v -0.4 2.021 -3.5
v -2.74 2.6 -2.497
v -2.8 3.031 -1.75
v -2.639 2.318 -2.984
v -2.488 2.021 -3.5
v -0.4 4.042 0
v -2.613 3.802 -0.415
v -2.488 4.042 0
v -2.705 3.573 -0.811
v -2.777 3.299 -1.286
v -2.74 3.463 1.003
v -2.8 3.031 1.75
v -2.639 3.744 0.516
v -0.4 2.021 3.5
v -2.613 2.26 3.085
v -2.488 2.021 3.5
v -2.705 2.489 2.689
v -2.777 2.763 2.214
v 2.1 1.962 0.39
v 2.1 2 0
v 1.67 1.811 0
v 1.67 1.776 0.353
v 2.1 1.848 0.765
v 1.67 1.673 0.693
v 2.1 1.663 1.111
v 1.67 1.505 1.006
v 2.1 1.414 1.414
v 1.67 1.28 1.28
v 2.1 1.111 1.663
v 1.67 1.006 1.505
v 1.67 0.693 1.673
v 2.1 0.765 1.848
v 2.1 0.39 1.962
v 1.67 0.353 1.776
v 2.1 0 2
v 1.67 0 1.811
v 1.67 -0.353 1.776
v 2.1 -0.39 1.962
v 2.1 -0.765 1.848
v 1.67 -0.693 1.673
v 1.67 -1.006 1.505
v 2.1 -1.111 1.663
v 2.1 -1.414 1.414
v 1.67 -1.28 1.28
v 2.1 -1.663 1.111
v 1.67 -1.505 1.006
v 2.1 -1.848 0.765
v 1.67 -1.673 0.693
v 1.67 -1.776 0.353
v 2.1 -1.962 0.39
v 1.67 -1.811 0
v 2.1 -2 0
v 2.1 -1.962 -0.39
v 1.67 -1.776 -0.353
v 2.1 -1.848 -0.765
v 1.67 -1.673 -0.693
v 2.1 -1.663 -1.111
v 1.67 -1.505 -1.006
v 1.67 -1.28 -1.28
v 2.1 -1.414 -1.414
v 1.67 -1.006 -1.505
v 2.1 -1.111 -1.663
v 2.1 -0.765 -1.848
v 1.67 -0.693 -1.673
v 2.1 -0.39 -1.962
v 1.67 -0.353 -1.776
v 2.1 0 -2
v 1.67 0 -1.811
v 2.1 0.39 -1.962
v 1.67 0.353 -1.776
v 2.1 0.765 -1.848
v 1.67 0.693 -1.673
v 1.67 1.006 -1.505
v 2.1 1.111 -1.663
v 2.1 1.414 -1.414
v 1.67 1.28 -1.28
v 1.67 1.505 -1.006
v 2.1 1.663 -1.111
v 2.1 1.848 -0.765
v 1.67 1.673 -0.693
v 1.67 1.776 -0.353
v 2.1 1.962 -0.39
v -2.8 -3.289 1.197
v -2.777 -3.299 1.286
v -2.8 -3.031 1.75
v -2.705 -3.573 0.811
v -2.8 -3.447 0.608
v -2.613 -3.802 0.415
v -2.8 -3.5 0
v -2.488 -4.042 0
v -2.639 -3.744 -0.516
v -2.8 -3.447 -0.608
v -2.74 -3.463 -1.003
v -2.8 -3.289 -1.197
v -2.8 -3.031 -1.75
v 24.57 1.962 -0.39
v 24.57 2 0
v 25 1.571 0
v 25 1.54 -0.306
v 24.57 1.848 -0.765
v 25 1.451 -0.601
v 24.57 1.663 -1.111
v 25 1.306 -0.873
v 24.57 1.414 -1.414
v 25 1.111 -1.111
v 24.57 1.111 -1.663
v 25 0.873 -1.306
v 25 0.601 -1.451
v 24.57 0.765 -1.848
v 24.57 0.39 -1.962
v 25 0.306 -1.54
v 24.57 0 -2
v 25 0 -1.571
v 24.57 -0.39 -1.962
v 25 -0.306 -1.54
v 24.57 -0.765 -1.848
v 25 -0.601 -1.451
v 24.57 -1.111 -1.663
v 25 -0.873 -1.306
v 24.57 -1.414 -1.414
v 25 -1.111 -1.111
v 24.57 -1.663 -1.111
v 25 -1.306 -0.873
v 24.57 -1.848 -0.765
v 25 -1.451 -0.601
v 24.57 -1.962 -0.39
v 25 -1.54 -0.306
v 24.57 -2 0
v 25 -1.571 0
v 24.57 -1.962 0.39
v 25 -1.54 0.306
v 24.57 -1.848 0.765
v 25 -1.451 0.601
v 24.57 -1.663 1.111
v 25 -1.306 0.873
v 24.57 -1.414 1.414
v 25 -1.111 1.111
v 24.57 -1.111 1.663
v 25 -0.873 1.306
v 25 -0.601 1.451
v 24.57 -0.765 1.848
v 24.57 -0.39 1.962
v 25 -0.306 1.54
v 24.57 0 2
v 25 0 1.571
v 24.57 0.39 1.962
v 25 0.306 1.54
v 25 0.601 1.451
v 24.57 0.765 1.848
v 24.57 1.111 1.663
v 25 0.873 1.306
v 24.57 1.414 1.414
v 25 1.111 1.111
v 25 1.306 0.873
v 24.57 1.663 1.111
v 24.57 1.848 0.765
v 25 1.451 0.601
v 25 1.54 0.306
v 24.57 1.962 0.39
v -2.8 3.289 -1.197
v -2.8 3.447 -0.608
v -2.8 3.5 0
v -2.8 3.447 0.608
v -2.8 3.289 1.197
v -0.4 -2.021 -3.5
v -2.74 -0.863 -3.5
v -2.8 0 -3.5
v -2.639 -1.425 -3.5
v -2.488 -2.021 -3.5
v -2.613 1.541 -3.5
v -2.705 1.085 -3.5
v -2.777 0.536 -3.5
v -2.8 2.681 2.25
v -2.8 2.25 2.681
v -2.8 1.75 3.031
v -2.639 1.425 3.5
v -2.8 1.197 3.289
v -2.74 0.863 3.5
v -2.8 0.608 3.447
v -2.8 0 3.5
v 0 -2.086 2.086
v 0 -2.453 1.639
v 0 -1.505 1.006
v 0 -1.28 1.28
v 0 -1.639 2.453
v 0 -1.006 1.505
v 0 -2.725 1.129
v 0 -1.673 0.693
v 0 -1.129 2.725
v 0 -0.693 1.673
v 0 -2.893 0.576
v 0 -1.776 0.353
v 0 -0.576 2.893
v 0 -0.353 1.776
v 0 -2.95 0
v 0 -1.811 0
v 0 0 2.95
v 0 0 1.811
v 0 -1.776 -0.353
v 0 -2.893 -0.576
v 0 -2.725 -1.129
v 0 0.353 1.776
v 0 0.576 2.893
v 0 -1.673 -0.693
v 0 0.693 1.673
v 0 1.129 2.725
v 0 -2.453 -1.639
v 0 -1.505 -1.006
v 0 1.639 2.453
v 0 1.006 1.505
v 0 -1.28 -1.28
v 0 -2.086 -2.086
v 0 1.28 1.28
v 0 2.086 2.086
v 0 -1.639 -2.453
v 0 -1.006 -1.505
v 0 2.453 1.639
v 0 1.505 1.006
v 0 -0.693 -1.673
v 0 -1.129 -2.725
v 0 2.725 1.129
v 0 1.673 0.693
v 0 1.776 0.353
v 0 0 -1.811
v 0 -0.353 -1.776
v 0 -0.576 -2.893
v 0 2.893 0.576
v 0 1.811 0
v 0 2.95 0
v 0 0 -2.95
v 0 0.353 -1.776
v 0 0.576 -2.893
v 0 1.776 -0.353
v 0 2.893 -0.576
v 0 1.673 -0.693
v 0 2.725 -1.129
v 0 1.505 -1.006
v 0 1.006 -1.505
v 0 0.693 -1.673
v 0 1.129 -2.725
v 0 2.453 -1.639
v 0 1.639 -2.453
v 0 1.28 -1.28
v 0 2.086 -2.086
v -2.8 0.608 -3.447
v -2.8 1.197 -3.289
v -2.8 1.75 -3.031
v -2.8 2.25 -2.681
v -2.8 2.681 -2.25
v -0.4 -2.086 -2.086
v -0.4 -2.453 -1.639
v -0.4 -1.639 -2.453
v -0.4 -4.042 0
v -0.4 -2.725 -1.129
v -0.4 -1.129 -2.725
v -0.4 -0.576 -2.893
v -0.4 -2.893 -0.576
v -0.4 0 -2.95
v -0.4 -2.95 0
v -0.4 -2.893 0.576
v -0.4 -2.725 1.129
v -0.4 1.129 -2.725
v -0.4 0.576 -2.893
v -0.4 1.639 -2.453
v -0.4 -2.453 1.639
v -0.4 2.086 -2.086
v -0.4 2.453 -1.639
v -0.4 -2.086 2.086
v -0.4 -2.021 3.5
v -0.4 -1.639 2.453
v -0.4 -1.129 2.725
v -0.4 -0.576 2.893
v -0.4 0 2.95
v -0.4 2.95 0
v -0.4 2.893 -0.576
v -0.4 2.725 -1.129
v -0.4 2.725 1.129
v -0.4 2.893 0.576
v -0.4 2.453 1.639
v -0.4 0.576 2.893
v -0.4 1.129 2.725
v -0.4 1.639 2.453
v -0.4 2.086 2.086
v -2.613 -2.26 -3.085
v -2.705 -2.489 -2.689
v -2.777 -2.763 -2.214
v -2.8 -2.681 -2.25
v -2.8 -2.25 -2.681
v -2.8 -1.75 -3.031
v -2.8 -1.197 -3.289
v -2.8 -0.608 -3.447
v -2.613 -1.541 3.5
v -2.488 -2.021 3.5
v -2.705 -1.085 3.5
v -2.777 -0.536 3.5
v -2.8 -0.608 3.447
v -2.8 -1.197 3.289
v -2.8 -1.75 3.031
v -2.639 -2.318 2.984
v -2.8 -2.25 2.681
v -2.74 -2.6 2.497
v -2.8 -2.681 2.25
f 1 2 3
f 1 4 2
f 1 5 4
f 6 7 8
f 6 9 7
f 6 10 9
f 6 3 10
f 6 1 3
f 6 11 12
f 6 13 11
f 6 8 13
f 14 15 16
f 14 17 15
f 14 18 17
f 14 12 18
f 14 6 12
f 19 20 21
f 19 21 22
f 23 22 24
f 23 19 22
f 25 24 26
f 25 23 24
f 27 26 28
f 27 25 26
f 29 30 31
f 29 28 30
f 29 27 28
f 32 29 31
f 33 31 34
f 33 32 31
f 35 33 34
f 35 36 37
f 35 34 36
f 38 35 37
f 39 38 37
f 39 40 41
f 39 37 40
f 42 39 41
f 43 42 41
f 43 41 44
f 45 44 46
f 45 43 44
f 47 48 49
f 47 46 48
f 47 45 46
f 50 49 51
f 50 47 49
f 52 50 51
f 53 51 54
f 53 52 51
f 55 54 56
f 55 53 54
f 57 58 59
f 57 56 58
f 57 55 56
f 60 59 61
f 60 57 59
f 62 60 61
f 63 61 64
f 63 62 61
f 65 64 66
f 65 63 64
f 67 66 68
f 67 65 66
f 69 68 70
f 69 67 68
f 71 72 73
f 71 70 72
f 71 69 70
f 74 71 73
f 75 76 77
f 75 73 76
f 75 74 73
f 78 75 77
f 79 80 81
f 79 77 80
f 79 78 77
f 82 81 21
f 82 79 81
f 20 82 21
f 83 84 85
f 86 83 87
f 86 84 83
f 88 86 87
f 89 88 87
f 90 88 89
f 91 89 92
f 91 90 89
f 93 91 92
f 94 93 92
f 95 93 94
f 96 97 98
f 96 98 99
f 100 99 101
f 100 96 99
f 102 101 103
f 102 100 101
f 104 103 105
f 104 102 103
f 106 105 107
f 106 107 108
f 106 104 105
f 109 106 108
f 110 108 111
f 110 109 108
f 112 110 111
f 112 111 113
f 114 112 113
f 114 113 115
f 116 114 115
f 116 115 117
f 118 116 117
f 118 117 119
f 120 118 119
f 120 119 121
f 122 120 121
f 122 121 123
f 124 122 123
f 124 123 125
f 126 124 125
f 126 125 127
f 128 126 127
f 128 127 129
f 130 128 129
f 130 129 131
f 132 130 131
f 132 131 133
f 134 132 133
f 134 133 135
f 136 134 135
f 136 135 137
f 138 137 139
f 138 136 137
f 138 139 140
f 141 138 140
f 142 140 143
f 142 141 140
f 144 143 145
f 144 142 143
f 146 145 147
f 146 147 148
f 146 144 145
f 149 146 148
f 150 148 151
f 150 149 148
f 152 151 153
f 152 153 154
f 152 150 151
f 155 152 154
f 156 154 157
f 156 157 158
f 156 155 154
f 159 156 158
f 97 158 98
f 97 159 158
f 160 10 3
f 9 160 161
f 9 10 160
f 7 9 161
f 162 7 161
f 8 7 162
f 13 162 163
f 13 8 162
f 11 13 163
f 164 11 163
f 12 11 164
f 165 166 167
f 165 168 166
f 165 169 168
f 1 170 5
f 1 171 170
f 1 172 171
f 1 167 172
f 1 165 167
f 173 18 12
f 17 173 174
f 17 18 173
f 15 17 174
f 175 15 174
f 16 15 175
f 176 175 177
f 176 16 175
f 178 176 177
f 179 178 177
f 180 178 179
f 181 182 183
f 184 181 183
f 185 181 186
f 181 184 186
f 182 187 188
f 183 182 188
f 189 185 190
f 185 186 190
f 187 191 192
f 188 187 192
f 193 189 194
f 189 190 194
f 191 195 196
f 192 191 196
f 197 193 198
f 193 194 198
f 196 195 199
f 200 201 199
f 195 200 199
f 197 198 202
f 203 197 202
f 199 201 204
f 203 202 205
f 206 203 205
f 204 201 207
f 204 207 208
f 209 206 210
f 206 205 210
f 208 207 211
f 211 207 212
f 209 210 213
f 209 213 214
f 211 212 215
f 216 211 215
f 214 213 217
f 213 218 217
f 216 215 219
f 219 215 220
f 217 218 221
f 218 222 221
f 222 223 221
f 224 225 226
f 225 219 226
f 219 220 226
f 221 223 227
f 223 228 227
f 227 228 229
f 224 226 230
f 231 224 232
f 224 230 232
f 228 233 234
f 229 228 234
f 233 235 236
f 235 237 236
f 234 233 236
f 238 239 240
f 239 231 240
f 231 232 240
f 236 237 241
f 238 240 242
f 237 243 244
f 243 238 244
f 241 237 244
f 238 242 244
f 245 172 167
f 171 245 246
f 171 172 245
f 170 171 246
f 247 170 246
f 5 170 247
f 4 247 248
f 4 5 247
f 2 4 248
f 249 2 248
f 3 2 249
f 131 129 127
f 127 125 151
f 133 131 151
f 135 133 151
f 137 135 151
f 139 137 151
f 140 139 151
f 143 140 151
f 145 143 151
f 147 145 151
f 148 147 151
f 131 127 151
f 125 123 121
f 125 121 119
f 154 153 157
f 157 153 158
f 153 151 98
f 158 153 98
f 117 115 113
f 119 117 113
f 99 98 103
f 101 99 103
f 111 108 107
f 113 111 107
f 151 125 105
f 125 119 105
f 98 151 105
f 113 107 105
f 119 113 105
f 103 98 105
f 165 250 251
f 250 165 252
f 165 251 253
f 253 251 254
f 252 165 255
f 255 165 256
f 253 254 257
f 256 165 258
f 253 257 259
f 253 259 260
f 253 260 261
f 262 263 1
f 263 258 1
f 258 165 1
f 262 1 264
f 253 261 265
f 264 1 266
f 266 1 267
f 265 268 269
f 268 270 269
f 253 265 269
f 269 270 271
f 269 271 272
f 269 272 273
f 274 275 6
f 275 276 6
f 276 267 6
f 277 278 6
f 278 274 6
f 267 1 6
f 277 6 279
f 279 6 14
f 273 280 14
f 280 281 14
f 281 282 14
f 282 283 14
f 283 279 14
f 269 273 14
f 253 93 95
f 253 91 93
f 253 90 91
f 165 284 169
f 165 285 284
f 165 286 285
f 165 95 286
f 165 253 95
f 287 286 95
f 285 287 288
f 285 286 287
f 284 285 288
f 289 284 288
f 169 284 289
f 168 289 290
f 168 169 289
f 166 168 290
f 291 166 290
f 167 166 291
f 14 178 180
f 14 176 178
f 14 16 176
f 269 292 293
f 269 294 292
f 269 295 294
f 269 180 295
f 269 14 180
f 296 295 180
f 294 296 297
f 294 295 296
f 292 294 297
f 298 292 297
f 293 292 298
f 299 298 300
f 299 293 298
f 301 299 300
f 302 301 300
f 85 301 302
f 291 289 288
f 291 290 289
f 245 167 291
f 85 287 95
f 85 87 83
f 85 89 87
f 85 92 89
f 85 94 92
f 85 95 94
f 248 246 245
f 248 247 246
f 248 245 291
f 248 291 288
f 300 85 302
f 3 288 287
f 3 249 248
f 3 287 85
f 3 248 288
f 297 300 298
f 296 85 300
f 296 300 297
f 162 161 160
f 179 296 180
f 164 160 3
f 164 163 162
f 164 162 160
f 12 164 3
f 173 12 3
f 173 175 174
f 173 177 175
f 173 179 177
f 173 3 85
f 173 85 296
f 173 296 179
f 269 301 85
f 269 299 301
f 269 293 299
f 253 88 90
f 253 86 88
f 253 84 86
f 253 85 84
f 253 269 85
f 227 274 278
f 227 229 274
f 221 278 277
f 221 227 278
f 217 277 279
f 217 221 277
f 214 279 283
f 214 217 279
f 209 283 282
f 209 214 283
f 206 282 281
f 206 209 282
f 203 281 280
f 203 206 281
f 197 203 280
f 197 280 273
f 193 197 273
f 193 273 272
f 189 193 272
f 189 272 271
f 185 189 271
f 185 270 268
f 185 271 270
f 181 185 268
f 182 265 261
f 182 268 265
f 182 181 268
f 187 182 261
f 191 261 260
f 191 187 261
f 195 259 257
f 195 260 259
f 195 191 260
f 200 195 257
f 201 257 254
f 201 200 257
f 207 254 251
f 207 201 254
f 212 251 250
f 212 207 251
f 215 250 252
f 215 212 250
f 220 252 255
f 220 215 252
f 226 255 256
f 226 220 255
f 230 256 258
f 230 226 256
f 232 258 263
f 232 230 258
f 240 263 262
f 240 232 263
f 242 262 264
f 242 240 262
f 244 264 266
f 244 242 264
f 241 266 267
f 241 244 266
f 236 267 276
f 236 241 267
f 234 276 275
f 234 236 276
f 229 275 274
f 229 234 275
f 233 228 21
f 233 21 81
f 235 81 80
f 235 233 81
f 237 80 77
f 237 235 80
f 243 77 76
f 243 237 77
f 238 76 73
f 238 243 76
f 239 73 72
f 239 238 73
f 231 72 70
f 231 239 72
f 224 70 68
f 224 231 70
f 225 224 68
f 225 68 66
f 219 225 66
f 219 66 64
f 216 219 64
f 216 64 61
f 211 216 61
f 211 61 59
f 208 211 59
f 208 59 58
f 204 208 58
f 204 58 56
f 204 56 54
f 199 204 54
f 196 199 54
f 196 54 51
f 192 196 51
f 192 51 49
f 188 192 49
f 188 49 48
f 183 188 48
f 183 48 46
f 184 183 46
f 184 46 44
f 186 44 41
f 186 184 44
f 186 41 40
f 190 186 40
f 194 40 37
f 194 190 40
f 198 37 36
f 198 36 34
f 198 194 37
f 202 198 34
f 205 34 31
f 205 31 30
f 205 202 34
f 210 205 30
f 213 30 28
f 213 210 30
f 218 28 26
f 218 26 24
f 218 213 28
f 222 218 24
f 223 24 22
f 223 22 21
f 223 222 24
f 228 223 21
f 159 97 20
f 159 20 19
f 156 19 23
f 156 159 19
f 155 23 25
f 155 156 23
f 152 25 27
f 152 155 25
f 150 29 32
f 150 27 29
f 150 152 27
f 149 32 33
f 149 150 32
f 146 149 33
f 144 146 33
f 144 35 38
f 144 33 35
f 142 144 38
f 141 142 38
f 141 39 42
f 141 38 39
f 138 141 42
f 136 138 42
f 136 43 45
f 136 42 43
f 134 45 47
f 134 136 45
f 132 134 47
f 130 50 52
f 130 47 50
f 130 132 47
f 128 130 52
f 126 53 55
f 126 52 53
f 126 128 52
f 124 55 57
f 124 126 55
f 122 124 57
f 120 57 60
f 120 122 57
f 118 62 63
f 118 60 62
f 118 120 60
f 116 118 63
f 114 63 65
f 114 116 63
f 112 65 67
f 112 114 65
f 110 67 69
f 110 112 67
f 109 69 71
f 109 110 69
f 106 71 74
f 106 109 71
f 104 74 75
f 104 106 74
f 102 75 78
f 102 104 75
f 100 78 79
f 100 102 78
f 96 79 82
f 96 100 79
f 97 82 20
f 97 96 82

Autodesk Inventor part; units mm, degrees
ref_plane "YZ Plane" through (0, 0, 0) normal (1, 0, 0) x (0, 1, 0)
ref_plane "XZ Plane" through (0, 0, 0) normal (0, 1, 0) x (-1, 0, 0)
sketch "Skizze1" plane through (0, 0, 0) normal (0, 0, 1) x (1, 0, 0)
  line L0 (0, 2.95) -> (0, 1.8106)
  line L1 (2.1, 2) -> (25, 2)
  line L2 (25, 2) -> (25, 0)
  line L3 (25, 0) -> (-0.4001, 0)
  line L4 (-5.4801, 0) -> (30.08, 0) projected
  line L5 (-0.4001, 0) -> (-0.4001, 2.95)
  line L6 (-0.4001, 2.95) -> (0, 2.95)
  line L7 (2.1, 2) -> (1.6705, 1.8106)
  line L8 (1.6705, 1.8106) -> (0, 1.8106)
  line L9 (0, -0.59) -> (0, 3.54) projected
  dimension "d0" = 25
  dimension "d1" = 22.9
  dimension "d2" = 4
  dimension "d9" = 0.4001
  dimension "d10" = 5.9
  dimension "d13" = 0.4295
  dimension "d14" = 3.6211
revolve "Körper" add sketch "Skizze1" angle 360 about axis through (25, 0, 0) along (-1, 0, 0)
sketch "Skizze2" plane through (-0.4001, 0, 0) normal (-1, 0, 0) x (0, 0, 1)
  line L0 (0, 4.0415) -> (3.5, 2.0207)
  line L1 (3.5, 2.0207) -> (3.5, -2.0207)
  line L2 (3.5, -2.0207) -> (0, -4.0415)
  line L3 (0, -4.0415) -> (-3.5, -2.0207)
  line L4 (-3.5, -2.0207) -> (-3.5, 2.0207)
  line L5 (-3.5, 2.0207) -> (0, 4.0415)
  point P0 (0, 0)
  point P1 (0, 0)
  dimension "d11" = 7
extrude "Kopf" add sketch "Skizze2" along normal blind 2.4
sketch "Skizze4" plane through (0, 0, 0) normal (0, 0, 1) x (1, 0, 0)
  line L0 (-2.8001, 3.5) -> (-2.8001, 4.0415)
  line L1 (-2.8001, 4.0415) -> (-2.4875, 4.0415)
  line L2 (-2.4875, 4.0415) -> (-2.8001, 3.5)
  line L3 (-3.2801, 0) -> (0.0799, 0) projected
  line L4 (-0.4001, 4.0415) -> (-2.8001, 4.0415) projected
  line L5 (-2.8001, 2.0207) -> (-2.8001, 4.0415) projected
  dimension "d5" = 30
  dimension "d19" = 7
revolve "Fase1" cut sketch "Skizze4" angle 360 about axis through (-10, 0, 0) along (1, 0, 0)
thread "Gewinde" size "M4x0.7" class "6g" standard "ISO Metric profile" length 22.9
chamfer "Fase2" distance 0.4294 distance2 0.4295 1 edges at (25, -2, 0) measured on face at (25, -0.0804, -0.6618)
ref_plane "Work Plane1" through (1.525, 0, 0) normal (0, 0, 1) x (1, 0, 0)
equation "\"d0\" = NLG"
equation "\"d1\" = GEL"
equation "\"d2\" = GD"
equation "\"d10\" = SD2"
equation "\"d14\" = BDM"
equation "\"d11\" = SW"
equation "\"d3\" = KOH - SD"
equation "\"d5\" = ANG1"
equation "\"d19\" = SW0"
equation "\"d15\" = GEL"
equation "\"d6\" = -0.5 * SPD + 0.5 * GD"
equation "\"NLG\" = 25"
equation "\"GD\" = NND"
equation "\"BDM\" = 3.62111"
equation "\"KOH\" = 2.8"
equation "\"GEL\" = 22.9"
equation "\"SW\" = 7"
equation "\"SW0\" = 7"
equation "\"SPD\" = NND - 1.2269 * PTC"
equation "\"SD2\" = 5.9"
equation "\"SD\" = 0.4"
equation "\"ANG1\" = 30deg"
equation "\"GAL\" = 0.61345 * PTC"
equation "\"GUL\" = 0.61345 * PTC"
equation "\"RR\" = 0.2"
equation "\"GD1\" = THREADDIA - 1.2269 * PTC"
equation "\"THREADDIA\" = 4"
equation "\"TOA\" = 30deg"
equation "\"PTC\" = 0.7"
equation "\"NND\" = 4"
equation "\"E0\" = 1.155 * SW"
properties part number "DIN 933 - M4  x 25" material "Stahl, weich"
